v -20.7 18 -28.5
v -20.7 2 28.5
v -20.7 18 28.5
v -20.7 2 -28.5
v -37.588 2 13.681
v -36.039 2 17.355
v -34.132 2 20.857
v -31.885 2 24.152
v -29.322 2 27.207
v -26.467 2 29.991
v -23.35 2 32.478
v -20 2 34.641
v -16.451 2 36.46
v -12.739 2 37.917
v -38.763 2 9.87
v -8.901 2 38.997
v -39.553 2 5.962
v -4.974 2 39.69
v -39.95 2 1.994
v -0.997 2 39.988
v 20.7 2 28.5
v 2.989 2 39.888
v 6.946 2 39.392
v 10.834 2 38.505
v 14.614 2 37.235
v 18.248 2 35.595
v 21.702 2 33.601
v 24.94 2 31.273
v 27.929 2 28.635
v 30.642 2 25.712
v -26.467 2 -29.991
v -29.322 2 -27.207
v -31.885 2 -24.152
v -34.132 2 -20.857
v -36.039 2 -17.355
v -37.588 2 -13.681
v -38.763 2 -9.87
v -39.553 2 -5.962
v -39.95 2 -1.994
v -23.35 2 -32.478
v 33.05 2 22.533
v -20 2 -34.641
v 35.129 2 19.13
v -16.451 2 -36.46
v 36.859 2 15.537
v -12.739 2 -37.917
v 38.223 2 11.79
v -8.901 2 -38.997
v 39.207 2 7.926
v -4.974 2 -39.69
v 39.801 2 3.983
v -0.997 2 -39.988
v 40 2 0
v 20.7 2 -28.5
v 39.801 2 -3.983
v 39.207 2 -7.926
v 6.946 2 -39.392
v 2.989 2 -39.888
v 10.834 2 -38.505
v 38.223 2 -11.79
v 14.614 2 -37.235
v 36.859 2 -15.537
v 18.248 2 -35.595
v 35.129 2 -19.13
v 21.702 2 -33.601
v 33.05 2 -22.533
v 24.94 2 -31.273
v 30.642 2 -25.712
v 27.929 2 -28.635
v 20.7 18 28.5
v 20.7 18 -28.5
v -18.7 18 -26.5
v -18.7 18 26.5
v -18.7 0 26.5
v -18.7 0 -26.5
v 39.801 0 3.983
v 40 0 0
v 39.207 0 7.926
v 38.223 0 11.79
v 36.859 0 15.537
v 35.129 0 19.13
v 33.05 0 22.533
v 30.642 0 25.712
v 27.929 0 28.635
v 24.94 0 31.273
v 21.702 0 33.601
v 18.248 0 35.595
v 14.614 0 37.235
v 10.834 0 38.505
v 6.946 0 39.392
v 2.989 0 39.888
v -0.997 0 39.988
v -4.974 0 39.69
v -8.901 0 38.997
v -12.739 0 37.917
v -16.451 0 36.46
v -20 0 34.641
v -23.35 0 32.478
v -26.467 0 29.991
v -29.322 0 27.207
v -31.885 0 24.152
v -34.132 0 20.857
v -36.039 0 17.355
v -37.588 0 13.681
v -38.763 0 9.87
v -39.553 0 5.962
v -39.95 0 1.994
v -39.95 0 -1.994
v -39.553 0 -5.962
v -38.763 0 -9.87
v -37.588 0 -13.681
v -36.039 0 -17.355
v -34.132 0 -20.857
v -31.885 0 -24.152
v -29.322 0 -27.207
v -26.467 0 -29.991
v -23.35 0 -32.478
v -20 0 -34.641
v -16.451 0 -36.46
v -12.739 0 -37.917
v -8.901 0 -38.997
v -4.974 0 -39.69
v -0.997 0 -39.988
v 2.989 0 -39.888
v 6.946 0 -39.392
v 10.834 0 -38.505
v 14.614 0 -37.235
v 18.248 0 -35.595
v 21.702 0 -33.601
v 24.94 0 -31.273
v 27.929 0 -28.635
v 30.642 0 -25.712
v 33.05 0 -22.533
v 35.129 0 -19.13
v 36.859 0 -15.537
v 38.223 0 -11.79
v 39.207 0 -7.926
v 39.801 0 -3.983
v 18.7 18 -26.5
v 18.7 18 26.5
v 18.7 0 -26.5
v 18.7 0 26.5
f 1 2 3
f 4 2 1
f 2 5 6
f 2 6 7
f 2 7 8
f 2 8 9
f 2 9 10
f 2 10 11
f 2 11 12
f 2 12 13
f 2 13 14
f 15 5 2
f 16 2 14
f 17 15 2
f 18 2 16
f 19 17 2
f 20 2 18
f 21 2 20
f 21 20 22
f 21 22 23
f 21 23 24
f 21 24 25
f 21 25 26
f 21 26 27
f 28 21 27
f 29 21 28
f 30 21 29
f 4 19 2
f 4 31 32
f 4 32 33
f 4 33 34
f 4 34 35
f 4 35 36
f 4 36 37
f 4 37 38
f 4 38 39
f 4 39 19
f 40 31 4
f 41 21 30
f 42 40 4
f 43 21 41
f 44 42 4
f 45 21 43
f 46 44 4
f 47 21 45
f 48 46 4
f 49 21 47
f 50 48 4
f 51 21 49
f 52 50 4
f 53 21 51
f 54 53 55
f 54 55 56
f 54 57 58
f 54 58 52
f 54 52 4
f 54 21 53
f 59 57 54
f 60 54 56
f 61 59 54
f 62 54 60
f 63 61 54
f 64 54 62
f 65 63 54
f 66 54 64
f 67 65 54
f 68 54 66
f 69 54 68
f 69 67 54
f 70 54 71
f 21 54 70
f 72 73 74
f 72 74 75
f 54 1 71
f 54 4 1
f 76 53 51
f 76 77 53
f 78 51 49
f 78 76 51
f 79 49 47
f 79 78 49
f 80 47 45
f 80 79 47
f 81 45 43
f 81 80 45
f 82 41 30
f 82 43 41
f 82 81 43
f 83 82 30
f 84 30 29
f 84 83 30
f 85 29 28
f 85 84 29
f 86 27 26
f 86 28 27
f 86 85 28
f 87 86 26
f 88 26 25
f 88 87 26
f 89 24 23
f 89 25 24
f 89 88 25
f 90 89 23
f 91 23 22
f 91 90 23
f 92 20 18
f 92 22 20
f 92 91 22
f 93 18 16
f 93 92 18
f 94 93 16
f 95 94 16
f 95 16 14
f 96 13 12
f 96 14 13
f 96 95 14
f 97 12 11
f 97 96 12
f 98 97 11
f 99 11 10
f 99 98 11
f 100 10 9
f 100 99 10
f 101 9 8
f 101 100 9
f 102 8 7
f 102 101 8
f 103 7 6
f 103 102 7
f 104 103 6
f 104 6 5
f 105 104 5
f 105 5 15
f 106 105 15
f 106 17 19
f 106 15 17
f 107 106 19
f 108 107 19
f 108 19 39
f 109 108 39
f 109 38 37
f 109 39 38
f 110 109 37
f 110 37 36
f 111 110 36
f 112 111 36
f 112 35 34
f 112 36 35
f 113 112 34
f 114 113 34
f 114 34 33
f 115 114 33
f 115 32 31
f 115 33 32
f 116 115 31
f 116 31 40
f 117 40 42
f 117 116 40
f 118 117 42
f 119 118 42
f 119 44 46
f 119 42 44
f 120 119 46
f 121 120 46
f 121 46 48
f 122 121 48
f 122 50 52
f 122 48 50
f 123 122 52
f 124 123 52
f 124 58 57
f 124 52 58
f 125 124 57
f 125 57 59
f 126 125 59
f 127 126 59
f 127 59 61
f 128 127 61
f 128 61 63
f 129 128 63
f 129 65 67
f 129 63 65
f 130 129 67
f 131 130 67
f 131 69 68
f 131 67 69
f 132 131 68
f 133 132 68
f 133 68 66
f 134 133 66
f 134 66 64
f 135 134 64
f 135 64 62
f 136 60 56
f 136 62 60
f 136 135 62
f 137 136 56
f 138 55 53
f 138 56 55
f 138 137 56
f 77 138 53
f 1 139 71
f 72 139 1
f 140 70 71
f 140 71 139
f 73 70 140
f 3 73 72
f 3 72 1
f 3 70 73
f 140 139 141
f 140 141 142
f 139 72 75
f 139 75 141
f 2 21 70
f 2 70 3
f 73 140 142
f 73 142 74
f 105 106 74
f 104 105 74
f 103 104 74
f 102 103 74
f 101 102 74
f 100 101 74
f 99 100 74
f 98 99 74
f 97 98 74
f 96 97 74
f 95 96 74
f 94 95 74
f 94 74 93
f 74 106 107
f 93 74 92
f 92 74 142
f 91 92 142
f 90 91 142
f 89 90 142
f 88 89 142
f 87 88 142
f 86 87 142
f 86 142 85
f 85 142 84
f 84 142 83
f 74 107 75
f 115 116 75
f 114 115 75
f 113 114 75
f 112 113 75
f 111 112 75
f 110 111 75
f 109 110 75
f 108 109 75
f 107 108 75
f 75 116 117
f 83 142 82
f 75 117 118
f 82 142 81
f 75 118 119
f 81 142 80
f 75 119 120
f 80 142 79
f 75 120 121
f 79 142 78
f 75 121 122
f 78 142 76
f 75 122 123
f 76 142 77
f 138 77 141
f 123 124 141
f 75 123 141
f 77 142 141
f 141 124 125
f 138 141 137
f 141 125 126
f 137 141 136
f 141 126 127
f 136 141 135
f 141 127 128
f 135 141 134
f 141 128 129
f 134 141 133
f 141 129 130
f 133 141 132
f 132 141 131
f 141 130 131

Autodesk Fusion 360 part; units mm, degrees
sketch "Sketch1" plane through (0, 0, 0) normal (0, 1, 0) x (1, 0, 0)
  circle A0 centre (0, 0) radius 40
  line L0 (26.5, -18.7) -> (-26.5, -18.7)
  line L1 (-26.5, -18.7) -> (-26.5, 18.7)
  line L2 (-26.5, 18.7) -> (26.5, 18.7)
  line L3 (26.5, -18.7) -> (-26.5, 18.7) construction
  line L4 (-26.5, -18.7) -> (26.5, 18.7) construction
  line L5 (-28.5, 20.7) -> (28.5, 20.7)
  line L6 (28.5, -20.7) -> (-28.5, -20.7)
  dimension "d1" = 80
  dimension "d2" = 37.4
  dimension "d3" = 53
  dimension "d5" = 37.4
  dimension "d6" = 53
extrude "Extrude1" add sketch "Sketch1" along normal blind 2
sketch "Sketch2" plane through (0, 2, 0) normal (0, 1, 0) x (-1, 0, 0)
  circle A0 centre (0, 0) radius 40
  line L0 (-18.7, 26.5) -> (18.7, 26.5)
  line L1 (18.7, 26.5) -> (18.7, -26.5)
  line L2 (18.7, -26.5) -> (-18.7, -26.5)
  line L3 (-18.7, -26.5) -> (-18.7, 26.5)
  line L4 (-18.7, 26.5) -> (18.7, -26.5) construction
  line L5 (18.7, 26.5) -> (-18.7, -26.5) construction
  line L6 (20.7, 28.5) -> (20.7, -28.5)
  line L7 (20.7, -28.5) -> (-20.7, -28.5)
  line L8 (-20.7, -28.5) -> (-20.7, 28.5)
  line L9 (-20.7, 28.5) -> (20.7, 28.5)
  dimension "d9" = 37.4
  dimension "d10" = 53
  dimension "d11" = -2
extrude "Extrude2" add sketch "Sketch2" along normal blind 16 contours L6 L7 L8 L9
extrude "Extrude3" cut 1 faces at (-6.2333, 2, -8.8333) along direction (0, -1, 0) blind 13
